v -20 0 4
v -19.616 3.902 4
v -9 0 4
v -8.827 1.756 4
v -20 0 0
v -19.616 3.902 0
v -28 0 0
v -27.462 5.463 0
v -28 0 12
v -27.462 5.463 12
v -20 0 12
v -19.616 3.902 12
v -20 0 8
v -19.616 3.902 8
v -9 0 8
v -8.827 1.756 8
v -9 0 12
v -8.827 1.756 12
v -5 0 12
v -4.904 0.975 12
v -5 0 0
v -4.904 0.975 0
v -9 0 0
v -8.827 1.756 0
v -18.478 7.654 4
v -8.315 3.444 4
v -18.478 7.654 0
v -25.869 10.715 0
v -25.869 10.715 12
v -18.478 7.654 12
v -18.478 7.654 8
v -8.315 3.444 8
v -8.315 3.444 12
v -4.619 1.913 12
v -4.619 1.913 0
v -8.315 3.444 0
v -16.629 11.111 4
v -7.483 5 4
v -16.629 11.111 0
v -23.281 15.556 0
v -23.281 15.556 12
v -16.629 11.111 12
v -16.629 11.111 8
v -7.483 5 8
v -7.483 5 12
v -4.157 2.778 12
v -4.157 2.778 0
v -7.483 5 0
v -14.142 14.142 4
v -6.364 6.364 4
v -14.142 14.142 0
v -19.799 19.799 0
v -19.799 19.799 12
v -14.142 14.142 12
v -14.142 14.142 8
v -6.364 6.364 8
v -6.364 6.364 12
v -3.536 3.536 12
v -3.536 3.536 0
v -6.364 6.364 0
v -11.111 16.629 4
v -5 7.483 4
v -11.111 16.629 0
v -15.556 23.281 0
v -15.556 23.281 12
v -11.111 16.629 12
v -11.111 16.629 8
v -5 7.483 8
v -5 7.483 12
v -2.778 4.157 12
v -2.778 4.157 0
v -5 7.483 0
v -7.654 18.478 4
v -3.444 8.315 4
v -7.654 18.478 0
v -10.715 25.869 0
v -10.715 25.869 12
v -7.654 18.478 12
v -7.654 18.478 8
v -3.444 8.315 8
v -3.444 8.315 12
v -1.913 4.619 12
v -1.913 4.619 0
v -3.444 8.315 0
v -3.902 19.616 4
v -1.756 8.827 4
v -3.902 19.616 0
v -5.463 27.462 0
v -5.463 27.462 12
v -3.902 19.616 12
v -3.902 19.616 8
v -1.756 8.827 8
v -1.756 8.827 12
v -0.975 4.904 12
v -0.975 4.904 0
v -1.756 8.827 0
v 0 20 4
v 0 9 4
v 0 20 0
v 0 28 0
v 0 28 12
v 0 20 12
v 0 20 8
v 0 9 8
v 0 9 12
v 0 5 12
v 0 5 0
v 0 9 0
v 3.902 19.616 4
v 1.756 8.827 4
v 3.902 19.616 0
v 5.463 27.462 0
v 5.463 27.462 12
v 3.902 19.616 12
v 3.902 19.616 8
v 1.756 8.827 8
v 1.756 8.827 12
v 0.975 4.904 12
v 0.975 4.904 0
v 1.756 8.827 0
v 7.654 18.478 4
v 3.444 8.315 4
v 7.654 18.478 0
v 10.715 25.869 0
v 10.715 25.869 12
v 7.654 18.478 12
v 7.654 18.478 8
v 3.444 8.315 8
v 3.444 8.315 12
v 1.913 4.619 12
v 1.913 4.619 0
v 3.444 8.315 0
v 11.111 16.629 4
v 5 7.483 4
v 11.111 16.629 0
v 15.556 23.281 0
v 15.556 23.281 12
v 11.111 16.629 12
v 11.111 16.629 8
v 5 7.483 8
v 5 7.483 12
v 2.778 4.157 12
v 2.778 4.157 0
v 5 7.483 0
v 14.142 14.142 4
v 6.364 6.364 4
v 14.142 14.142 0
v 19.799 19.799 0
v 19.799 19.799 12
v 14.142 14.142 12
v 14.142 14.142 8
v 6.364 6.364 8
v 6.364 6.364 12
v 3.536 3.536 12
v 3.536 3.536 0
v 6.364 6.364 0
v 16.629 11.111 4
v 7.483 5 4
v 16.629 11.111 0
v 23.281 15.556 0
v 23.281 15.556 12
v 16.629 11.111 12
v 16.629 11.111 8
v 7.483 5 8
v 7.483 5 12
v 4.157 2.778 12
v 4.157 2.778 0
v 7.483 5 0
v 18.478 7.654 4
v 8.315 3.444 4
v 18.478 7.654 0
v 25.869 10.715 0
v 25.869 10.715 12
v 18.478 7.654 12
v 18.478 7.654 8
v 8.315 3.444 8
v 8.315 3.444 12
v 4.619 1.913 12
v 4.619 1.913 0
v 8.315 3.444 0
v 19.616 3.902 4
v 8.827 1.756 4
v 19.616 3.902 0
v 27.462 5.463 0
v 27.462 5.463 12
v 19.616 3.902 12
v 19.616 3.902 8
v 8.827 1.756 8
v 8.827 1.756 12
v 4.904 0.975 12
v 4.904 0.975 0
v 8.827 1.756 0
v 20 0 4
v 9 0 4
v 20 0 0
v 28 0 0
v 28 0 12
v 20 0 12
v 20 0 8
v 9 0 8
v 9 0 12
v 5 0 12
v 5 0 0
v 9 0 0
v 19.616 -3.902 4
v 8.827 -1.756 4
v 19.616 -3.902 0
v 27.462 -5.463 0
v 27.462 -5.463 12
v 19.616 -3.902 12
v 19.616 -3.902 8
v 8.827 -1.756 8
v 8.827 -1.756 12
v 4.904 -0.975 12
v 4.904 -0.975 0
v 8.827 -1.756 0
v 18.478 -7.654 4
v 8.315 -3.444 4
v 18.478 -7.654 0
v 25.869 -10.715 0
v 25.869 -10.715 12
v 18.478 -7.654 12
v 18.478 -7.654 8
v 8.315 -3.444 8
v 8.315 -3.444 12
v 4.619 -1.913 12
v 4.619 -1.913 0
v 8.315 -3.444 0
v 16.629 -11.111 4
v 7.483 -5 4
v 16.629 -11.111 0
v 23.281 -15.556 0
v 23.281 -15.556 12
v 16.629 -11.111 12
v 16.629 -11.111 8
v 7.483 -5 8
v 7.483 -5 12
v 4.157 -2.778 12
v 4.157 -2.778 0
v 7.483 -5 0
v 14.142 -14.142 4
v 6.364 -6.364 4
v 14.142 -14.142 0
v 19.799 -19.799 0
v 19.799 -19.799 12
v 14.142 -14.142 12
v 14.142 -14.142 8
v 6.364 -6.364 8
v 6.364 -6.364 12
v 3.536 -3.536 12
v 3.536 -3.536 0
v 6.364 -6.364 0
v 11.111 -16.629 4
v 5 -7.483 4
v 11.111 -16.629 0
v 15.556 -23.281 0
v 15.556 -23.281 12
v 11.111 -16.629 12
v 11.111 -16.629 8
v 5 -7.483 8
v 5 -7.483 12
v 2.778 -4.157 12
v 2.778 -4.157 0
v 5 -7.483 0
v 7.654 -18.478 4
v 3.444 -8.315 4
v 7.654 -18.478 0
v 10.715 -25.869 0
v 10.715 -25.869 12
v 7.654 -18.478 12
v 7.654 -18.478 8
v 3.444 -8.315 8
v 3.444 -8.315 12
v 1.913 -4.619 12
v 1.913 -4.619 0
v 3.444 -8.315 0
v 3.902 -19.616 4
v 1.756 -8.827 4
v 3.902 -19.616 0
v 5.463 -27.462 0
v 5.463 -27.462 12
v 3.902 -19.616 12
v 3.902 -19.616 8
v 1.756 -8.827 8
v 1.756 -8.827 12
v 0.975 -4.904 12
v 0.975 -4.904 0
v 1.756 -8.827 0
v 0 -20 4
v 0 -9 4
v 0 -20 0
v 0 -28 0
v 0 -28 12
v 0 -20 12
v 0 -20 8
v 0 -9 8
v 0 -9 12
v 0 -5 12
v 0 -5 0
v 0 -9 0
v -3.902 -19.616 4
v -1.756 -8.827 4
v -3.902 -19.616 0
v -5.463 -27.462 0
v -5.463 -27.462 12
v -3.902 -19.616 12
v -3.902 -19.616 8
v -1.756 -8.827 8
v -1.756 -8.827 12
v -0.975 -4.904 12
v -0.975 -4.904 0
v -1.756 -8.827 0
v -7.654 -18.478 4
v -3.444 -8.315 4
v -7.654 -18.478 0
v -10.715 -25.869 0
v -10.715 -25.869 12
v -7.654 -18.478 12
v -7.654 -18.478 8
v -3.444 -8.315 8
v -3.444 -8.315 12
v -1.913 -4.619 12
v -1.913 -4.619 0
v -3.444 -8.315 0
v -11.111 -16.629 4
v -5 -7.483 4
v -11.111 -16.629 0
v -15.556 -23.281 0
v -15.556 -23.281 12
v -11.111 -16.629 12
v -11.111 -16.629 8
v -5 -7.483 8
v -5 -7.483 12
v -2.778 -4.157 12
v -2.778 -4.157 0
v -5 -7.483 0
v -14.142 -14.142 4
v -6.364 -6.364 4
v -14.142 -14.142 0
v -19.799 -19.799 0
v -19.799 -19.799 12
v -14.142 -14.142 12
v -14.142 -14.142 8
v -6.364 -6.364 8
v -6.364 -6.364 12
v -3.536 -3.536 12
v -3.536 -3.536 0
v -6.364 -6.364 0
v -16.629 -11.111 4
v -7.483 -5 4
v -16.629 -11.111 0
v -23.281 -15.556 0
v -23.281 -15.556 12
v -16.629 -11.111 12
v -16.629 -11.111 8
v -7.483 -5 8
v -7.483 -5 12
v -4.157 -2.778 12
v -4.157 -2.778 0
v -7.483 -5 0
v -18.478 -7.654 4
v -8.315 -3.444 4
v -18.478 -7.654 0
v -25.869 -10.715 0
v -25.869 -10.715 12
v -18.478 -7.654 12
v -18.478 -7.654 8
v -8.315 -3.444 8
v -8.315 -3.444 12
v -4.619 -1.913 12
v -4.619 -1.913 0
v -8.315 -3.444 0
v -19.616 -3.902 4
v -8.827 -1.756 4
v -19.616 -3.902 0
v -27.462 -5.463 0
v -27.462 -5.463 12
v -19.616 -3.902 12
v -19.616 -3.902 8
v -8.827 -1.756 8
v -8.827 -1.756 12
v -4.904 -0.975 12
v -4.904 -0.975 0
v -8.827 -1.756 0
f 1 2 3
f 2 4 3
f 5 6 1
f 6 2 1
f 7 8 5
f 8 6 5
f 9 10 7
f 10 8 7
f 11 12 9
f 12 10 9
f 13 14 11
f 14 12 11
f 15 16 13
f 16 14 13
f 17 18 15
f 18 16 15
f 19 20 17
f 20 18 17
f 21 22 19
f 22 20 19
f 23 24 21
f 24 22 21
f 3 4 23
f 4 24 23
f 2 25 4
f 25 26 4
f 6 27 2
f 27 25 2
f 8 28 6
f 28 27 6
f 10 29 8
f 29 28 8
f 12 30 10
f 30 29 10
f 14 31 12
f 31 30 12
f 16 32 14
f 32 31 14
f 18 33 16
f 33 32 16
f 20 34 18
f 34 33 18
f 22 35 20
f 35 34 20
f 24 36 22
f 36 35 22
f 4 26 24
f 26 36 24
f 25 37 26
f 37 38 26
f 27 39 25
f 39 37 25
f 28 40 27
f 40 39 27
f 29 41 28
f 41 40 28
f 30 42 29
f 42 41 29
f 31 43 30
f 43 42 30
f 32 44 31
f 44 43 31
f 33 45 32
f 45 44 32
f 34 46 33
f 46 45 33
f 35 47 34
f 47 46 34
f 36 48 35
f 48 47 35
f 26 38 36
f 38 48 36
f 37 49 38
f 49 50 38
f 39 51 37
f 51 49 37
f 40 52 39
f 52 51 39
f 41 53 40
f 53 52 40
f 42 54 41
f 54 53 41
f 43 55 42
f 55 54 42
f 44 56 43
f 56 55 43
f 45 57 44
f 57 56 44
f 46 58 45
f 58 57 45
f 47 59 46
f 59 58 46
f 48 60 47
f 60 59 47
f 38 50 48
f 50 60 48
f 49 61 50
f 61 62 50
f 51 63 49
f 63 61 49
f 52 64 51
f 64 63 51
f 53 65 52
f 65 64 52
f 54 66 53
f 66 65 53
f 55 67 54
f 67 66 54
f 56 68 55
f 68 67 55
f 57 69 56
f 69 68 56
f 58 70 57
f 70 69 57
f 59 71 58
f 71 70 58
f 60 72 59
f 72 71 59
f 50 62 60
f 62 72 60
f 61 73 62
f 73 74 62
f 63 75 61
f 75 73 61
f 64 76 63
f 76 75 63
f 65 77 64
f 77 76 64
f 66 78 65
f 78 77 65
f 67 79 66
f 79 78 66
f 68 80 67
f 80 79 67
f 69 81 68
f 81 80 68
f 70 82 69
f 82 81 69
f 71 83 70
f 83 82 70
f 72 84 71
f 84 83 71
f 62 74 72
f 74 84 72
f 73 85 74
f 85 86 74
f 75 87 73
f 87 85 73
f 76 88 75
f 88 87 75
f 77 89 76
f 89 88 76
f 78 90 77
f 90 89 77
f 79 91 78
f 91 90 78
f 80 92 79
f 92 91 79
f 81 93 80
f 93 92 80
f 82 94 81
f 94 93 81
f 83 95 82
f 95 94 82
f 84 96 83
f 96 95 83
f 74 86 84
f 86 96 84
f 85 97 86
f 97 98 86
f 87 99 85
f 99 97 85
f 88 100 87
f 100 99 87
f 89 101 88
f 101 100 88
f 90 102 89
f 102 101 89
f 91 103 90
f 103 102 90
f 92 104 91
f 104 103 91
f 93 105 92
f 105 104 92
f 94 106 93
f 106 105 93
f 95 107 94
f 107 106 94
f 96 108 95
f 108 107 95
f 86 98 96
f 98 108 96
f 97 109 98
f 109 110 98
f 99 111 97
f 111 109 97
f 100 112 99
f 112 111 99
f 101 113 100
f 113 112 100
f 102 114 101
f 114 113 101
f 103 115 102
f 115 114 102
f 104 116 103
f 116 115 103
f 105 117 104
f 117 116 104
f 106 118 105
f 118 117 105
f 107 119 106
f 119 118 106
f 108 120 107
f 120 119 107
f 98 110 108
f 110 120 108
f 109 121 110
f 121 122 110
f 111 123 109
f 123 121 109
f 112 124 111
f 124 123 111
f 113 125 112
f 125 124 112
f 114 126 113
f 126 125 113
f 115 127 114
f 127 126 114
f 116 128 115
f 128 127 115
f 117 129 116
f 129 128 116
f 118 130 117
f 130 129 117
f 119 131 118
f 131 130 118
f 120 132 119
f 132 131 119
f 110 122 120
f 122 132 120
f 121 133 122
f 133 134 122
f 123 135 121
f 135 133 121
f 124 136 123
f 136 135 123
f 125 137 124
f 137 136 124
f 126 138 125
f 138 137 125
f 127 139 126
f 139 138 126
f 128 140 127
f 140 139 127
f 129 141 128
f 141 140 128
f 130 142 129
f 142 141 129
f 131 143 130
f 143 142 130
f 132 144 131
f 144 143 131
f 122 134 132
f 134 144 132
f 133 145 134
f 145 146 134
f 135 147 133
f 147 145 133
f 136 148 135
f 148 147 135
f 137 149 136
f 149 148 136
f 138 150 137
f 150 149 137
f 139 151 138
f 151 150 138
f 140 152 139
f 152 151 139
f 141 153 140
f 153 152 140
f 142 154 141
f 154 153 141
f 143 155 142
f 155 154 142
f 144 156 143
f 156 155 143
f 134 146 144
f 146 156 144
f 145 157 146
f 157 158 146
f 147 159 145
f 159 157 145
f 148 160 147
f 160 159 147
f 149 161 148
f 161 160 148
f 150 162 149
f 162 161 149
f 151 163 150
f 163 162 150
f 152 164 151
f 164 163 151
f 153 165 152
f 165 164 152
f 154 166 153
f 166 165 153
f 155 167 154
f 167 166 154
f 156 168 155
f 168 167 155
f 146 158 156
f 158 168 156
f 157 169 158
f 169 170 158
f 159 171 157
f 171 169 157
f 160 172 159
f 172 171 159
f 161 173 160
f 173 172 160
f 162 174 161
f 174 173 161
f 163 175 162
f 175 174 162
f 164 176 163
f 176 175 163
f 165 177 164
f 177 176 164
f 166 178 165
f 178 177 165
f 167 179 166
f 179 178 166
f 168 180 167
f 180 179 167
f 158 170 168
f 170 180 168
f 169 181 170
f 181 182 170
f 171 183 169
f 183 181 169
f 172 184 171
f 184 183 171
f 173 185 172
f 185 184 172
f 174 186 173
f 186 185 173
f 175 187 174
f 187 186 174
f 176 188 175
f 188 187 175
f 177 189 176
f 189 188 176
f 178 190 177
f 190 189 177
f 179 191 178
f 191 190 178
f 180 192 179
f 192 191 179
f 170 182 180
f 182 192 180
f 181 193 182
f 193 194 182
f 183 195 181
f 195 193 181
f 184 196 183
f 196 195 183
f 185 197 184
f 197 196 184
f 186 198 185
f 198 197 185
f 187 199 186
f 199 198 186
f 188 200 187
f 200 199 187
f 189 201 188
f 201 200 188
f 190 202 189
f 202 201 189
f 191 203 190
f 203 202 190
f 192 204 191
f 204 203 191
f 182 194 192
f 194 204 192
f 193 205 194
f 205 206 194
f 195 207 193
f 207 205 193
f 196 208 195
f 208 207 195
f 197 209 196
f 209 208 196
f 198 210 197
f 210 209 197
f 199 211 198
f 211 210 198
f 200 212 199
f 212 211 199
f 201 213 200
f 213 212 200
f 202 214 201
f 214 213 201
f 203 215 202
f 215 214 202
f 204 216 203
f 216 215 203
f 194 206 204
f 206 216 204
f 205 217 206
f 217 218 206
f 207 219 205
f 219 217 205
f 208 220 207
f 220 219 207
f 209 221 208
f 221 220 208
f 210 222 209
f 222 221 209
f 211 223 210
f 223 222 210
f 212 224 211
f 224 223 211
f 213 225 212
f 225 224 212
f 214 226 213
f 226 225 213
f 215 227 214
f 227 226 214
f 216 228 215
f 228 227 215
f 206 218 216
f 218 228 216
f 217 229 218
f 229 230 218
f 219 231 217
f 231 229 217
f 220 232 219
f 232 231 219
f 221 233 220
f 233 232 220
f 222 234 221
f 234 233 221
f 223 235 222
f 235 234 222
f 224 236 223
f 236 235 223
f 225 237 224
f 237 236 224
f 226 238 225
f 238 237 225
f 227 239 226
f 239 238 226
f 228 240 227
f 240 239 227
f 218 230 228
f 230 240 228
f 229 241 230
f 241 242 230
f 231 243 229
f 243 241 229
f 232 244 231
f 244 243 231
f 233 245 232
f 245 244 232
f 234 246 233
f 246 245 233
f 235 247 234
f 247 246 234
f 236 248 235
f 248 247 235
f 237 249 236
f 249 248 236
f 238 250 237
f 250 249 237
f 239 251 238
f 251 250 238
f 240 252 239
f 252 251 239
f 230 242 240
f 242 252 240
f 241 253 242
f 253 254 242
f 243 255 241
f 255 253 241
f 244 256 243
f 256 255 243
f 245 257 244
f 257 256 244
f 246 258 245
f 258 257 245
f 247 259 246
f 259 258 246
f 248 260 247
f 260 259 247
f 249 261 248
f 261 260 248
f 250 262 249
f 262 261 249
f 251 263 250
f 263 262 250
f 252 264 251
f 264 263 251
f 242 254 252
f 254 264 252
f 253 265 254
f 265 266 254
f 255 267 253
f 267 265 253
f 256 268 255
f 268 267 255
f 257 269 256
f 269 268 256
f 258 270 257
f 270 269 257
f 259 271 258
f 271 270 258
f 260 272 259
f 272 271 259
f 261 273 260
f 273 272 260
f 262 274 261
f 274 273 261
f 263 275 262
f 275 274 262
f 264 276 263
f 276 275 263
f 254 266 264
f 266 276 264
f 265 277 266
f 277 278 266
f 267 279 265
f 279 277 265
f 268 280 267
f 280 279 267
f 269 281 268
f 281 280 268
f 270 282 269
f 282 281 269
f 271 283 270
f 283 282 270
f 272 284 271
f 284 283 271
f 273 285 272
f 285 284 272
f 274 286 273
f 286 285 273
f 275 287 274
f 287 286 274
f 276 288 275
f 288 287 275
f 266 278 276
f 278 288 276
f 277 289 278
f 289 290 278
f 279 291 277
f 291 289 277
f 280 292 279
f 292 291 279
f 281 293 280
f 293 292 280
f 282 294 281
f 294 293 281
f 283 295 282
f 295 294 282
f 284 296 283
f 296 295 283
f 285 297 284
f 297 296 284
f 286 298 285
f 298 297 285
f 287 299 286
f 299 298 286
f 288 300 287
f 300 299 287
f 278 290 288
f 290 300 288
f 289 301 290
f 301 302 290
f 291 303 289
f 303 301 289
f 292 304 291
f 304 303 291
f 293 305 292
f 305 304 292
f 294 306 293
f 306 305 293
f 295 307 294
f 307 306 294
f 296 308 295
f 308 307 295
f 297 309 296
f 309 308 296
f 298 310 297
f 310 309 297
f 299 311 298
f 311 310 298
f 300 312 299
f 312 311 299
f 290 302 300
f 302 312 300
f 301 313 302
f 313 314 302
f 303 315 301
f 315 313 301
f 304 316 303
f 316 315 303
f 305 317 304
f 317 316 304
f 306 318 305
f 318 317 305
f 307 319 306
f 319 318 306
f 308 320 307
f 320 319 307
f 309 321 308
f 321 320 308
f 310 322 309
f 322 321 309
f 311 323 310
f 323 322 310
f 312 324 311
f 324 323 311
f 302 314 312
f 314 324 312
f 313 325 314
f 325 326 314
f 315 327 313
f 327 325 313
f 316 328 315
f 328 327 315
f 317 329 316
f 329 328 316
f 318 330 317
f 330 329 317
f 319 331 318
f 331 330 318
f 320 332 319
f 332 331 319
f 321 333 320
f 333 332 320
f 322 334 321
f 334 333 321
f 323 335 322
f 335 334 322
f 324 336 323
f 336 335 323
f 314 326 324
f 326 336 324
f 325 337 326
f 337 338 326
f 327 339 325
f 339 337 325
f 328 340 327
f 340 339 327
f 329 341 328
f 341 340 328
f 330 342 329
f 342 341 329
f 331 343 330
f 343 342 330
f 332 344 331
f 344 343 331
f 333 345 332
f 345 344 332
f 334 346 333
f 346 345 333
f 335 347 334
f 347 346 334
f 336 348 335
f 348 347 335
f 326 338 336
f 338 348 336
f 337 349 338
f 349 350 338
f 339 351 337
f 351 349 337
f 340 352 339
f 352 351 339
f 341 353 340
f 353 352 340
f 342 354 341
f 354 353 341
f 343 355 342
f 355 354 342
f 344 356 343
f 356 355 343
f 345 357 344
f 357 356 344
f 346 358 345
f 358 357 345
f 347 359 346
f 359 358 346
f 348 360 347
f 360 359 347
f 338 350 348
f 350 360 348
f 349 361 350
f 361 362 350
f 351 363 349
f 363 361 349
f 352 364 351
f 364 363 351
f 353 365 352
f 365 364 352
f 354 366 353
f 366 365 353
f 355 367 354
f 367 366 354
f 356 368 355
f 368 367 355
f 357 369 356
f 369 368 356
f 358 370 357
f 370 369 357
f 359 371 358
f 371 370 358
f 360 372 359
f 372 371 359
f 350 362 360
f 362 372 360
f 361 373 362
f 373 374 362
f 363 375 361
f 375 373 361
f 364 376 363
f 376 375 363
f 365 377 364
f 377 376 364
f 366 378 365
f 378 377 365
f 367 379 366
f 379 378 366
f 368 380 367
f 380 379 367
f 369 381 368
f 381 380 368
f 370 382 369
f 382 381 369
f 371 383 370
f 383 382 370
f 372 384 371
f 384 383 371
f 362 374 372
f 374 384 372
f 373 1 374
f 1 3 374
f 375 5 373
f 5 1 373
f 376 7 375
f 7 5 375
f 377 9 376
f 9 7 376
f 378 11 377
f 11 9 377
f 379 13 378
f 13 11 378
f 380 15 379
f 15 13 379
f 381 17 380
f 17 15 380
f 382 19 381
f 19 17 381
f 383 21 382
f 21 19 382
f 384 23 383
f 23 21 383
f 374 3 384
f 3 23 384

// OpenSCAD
$fn = 32;

// ----------------------------------------------------------------------
// Revolved part: handwheel R28
// ----------------------------------------------------------------------

// --- parameters (mm) ---
bore_r = 5;               // bore radius
rim_r = 28;               // rim radius
rim_w = 8;                // rim axial width
rim_t = 12;               // rim diameter height
hub_r = 9;                // hub radius
web_t = 4;                // web thickness
revolve_angle = 360;      // revolve sweep, degrees

bore_d = 2 * bore_r;
rim_d = 2 * rim_r;
hub_d = 2 * hub_r;

profile = [[5, 0], [9, 0], [9, 4], [20, 4], [20, 0], [28, 0], [28, 12], [20, 12], [20, 8], [9, 8], [9, 12], [5, 12]];  // primary outline, 12 points, counter clockwise

// --- the one profile operation ---
rotate_extrude(angle = revolve_angle) polygon(points = profile);
